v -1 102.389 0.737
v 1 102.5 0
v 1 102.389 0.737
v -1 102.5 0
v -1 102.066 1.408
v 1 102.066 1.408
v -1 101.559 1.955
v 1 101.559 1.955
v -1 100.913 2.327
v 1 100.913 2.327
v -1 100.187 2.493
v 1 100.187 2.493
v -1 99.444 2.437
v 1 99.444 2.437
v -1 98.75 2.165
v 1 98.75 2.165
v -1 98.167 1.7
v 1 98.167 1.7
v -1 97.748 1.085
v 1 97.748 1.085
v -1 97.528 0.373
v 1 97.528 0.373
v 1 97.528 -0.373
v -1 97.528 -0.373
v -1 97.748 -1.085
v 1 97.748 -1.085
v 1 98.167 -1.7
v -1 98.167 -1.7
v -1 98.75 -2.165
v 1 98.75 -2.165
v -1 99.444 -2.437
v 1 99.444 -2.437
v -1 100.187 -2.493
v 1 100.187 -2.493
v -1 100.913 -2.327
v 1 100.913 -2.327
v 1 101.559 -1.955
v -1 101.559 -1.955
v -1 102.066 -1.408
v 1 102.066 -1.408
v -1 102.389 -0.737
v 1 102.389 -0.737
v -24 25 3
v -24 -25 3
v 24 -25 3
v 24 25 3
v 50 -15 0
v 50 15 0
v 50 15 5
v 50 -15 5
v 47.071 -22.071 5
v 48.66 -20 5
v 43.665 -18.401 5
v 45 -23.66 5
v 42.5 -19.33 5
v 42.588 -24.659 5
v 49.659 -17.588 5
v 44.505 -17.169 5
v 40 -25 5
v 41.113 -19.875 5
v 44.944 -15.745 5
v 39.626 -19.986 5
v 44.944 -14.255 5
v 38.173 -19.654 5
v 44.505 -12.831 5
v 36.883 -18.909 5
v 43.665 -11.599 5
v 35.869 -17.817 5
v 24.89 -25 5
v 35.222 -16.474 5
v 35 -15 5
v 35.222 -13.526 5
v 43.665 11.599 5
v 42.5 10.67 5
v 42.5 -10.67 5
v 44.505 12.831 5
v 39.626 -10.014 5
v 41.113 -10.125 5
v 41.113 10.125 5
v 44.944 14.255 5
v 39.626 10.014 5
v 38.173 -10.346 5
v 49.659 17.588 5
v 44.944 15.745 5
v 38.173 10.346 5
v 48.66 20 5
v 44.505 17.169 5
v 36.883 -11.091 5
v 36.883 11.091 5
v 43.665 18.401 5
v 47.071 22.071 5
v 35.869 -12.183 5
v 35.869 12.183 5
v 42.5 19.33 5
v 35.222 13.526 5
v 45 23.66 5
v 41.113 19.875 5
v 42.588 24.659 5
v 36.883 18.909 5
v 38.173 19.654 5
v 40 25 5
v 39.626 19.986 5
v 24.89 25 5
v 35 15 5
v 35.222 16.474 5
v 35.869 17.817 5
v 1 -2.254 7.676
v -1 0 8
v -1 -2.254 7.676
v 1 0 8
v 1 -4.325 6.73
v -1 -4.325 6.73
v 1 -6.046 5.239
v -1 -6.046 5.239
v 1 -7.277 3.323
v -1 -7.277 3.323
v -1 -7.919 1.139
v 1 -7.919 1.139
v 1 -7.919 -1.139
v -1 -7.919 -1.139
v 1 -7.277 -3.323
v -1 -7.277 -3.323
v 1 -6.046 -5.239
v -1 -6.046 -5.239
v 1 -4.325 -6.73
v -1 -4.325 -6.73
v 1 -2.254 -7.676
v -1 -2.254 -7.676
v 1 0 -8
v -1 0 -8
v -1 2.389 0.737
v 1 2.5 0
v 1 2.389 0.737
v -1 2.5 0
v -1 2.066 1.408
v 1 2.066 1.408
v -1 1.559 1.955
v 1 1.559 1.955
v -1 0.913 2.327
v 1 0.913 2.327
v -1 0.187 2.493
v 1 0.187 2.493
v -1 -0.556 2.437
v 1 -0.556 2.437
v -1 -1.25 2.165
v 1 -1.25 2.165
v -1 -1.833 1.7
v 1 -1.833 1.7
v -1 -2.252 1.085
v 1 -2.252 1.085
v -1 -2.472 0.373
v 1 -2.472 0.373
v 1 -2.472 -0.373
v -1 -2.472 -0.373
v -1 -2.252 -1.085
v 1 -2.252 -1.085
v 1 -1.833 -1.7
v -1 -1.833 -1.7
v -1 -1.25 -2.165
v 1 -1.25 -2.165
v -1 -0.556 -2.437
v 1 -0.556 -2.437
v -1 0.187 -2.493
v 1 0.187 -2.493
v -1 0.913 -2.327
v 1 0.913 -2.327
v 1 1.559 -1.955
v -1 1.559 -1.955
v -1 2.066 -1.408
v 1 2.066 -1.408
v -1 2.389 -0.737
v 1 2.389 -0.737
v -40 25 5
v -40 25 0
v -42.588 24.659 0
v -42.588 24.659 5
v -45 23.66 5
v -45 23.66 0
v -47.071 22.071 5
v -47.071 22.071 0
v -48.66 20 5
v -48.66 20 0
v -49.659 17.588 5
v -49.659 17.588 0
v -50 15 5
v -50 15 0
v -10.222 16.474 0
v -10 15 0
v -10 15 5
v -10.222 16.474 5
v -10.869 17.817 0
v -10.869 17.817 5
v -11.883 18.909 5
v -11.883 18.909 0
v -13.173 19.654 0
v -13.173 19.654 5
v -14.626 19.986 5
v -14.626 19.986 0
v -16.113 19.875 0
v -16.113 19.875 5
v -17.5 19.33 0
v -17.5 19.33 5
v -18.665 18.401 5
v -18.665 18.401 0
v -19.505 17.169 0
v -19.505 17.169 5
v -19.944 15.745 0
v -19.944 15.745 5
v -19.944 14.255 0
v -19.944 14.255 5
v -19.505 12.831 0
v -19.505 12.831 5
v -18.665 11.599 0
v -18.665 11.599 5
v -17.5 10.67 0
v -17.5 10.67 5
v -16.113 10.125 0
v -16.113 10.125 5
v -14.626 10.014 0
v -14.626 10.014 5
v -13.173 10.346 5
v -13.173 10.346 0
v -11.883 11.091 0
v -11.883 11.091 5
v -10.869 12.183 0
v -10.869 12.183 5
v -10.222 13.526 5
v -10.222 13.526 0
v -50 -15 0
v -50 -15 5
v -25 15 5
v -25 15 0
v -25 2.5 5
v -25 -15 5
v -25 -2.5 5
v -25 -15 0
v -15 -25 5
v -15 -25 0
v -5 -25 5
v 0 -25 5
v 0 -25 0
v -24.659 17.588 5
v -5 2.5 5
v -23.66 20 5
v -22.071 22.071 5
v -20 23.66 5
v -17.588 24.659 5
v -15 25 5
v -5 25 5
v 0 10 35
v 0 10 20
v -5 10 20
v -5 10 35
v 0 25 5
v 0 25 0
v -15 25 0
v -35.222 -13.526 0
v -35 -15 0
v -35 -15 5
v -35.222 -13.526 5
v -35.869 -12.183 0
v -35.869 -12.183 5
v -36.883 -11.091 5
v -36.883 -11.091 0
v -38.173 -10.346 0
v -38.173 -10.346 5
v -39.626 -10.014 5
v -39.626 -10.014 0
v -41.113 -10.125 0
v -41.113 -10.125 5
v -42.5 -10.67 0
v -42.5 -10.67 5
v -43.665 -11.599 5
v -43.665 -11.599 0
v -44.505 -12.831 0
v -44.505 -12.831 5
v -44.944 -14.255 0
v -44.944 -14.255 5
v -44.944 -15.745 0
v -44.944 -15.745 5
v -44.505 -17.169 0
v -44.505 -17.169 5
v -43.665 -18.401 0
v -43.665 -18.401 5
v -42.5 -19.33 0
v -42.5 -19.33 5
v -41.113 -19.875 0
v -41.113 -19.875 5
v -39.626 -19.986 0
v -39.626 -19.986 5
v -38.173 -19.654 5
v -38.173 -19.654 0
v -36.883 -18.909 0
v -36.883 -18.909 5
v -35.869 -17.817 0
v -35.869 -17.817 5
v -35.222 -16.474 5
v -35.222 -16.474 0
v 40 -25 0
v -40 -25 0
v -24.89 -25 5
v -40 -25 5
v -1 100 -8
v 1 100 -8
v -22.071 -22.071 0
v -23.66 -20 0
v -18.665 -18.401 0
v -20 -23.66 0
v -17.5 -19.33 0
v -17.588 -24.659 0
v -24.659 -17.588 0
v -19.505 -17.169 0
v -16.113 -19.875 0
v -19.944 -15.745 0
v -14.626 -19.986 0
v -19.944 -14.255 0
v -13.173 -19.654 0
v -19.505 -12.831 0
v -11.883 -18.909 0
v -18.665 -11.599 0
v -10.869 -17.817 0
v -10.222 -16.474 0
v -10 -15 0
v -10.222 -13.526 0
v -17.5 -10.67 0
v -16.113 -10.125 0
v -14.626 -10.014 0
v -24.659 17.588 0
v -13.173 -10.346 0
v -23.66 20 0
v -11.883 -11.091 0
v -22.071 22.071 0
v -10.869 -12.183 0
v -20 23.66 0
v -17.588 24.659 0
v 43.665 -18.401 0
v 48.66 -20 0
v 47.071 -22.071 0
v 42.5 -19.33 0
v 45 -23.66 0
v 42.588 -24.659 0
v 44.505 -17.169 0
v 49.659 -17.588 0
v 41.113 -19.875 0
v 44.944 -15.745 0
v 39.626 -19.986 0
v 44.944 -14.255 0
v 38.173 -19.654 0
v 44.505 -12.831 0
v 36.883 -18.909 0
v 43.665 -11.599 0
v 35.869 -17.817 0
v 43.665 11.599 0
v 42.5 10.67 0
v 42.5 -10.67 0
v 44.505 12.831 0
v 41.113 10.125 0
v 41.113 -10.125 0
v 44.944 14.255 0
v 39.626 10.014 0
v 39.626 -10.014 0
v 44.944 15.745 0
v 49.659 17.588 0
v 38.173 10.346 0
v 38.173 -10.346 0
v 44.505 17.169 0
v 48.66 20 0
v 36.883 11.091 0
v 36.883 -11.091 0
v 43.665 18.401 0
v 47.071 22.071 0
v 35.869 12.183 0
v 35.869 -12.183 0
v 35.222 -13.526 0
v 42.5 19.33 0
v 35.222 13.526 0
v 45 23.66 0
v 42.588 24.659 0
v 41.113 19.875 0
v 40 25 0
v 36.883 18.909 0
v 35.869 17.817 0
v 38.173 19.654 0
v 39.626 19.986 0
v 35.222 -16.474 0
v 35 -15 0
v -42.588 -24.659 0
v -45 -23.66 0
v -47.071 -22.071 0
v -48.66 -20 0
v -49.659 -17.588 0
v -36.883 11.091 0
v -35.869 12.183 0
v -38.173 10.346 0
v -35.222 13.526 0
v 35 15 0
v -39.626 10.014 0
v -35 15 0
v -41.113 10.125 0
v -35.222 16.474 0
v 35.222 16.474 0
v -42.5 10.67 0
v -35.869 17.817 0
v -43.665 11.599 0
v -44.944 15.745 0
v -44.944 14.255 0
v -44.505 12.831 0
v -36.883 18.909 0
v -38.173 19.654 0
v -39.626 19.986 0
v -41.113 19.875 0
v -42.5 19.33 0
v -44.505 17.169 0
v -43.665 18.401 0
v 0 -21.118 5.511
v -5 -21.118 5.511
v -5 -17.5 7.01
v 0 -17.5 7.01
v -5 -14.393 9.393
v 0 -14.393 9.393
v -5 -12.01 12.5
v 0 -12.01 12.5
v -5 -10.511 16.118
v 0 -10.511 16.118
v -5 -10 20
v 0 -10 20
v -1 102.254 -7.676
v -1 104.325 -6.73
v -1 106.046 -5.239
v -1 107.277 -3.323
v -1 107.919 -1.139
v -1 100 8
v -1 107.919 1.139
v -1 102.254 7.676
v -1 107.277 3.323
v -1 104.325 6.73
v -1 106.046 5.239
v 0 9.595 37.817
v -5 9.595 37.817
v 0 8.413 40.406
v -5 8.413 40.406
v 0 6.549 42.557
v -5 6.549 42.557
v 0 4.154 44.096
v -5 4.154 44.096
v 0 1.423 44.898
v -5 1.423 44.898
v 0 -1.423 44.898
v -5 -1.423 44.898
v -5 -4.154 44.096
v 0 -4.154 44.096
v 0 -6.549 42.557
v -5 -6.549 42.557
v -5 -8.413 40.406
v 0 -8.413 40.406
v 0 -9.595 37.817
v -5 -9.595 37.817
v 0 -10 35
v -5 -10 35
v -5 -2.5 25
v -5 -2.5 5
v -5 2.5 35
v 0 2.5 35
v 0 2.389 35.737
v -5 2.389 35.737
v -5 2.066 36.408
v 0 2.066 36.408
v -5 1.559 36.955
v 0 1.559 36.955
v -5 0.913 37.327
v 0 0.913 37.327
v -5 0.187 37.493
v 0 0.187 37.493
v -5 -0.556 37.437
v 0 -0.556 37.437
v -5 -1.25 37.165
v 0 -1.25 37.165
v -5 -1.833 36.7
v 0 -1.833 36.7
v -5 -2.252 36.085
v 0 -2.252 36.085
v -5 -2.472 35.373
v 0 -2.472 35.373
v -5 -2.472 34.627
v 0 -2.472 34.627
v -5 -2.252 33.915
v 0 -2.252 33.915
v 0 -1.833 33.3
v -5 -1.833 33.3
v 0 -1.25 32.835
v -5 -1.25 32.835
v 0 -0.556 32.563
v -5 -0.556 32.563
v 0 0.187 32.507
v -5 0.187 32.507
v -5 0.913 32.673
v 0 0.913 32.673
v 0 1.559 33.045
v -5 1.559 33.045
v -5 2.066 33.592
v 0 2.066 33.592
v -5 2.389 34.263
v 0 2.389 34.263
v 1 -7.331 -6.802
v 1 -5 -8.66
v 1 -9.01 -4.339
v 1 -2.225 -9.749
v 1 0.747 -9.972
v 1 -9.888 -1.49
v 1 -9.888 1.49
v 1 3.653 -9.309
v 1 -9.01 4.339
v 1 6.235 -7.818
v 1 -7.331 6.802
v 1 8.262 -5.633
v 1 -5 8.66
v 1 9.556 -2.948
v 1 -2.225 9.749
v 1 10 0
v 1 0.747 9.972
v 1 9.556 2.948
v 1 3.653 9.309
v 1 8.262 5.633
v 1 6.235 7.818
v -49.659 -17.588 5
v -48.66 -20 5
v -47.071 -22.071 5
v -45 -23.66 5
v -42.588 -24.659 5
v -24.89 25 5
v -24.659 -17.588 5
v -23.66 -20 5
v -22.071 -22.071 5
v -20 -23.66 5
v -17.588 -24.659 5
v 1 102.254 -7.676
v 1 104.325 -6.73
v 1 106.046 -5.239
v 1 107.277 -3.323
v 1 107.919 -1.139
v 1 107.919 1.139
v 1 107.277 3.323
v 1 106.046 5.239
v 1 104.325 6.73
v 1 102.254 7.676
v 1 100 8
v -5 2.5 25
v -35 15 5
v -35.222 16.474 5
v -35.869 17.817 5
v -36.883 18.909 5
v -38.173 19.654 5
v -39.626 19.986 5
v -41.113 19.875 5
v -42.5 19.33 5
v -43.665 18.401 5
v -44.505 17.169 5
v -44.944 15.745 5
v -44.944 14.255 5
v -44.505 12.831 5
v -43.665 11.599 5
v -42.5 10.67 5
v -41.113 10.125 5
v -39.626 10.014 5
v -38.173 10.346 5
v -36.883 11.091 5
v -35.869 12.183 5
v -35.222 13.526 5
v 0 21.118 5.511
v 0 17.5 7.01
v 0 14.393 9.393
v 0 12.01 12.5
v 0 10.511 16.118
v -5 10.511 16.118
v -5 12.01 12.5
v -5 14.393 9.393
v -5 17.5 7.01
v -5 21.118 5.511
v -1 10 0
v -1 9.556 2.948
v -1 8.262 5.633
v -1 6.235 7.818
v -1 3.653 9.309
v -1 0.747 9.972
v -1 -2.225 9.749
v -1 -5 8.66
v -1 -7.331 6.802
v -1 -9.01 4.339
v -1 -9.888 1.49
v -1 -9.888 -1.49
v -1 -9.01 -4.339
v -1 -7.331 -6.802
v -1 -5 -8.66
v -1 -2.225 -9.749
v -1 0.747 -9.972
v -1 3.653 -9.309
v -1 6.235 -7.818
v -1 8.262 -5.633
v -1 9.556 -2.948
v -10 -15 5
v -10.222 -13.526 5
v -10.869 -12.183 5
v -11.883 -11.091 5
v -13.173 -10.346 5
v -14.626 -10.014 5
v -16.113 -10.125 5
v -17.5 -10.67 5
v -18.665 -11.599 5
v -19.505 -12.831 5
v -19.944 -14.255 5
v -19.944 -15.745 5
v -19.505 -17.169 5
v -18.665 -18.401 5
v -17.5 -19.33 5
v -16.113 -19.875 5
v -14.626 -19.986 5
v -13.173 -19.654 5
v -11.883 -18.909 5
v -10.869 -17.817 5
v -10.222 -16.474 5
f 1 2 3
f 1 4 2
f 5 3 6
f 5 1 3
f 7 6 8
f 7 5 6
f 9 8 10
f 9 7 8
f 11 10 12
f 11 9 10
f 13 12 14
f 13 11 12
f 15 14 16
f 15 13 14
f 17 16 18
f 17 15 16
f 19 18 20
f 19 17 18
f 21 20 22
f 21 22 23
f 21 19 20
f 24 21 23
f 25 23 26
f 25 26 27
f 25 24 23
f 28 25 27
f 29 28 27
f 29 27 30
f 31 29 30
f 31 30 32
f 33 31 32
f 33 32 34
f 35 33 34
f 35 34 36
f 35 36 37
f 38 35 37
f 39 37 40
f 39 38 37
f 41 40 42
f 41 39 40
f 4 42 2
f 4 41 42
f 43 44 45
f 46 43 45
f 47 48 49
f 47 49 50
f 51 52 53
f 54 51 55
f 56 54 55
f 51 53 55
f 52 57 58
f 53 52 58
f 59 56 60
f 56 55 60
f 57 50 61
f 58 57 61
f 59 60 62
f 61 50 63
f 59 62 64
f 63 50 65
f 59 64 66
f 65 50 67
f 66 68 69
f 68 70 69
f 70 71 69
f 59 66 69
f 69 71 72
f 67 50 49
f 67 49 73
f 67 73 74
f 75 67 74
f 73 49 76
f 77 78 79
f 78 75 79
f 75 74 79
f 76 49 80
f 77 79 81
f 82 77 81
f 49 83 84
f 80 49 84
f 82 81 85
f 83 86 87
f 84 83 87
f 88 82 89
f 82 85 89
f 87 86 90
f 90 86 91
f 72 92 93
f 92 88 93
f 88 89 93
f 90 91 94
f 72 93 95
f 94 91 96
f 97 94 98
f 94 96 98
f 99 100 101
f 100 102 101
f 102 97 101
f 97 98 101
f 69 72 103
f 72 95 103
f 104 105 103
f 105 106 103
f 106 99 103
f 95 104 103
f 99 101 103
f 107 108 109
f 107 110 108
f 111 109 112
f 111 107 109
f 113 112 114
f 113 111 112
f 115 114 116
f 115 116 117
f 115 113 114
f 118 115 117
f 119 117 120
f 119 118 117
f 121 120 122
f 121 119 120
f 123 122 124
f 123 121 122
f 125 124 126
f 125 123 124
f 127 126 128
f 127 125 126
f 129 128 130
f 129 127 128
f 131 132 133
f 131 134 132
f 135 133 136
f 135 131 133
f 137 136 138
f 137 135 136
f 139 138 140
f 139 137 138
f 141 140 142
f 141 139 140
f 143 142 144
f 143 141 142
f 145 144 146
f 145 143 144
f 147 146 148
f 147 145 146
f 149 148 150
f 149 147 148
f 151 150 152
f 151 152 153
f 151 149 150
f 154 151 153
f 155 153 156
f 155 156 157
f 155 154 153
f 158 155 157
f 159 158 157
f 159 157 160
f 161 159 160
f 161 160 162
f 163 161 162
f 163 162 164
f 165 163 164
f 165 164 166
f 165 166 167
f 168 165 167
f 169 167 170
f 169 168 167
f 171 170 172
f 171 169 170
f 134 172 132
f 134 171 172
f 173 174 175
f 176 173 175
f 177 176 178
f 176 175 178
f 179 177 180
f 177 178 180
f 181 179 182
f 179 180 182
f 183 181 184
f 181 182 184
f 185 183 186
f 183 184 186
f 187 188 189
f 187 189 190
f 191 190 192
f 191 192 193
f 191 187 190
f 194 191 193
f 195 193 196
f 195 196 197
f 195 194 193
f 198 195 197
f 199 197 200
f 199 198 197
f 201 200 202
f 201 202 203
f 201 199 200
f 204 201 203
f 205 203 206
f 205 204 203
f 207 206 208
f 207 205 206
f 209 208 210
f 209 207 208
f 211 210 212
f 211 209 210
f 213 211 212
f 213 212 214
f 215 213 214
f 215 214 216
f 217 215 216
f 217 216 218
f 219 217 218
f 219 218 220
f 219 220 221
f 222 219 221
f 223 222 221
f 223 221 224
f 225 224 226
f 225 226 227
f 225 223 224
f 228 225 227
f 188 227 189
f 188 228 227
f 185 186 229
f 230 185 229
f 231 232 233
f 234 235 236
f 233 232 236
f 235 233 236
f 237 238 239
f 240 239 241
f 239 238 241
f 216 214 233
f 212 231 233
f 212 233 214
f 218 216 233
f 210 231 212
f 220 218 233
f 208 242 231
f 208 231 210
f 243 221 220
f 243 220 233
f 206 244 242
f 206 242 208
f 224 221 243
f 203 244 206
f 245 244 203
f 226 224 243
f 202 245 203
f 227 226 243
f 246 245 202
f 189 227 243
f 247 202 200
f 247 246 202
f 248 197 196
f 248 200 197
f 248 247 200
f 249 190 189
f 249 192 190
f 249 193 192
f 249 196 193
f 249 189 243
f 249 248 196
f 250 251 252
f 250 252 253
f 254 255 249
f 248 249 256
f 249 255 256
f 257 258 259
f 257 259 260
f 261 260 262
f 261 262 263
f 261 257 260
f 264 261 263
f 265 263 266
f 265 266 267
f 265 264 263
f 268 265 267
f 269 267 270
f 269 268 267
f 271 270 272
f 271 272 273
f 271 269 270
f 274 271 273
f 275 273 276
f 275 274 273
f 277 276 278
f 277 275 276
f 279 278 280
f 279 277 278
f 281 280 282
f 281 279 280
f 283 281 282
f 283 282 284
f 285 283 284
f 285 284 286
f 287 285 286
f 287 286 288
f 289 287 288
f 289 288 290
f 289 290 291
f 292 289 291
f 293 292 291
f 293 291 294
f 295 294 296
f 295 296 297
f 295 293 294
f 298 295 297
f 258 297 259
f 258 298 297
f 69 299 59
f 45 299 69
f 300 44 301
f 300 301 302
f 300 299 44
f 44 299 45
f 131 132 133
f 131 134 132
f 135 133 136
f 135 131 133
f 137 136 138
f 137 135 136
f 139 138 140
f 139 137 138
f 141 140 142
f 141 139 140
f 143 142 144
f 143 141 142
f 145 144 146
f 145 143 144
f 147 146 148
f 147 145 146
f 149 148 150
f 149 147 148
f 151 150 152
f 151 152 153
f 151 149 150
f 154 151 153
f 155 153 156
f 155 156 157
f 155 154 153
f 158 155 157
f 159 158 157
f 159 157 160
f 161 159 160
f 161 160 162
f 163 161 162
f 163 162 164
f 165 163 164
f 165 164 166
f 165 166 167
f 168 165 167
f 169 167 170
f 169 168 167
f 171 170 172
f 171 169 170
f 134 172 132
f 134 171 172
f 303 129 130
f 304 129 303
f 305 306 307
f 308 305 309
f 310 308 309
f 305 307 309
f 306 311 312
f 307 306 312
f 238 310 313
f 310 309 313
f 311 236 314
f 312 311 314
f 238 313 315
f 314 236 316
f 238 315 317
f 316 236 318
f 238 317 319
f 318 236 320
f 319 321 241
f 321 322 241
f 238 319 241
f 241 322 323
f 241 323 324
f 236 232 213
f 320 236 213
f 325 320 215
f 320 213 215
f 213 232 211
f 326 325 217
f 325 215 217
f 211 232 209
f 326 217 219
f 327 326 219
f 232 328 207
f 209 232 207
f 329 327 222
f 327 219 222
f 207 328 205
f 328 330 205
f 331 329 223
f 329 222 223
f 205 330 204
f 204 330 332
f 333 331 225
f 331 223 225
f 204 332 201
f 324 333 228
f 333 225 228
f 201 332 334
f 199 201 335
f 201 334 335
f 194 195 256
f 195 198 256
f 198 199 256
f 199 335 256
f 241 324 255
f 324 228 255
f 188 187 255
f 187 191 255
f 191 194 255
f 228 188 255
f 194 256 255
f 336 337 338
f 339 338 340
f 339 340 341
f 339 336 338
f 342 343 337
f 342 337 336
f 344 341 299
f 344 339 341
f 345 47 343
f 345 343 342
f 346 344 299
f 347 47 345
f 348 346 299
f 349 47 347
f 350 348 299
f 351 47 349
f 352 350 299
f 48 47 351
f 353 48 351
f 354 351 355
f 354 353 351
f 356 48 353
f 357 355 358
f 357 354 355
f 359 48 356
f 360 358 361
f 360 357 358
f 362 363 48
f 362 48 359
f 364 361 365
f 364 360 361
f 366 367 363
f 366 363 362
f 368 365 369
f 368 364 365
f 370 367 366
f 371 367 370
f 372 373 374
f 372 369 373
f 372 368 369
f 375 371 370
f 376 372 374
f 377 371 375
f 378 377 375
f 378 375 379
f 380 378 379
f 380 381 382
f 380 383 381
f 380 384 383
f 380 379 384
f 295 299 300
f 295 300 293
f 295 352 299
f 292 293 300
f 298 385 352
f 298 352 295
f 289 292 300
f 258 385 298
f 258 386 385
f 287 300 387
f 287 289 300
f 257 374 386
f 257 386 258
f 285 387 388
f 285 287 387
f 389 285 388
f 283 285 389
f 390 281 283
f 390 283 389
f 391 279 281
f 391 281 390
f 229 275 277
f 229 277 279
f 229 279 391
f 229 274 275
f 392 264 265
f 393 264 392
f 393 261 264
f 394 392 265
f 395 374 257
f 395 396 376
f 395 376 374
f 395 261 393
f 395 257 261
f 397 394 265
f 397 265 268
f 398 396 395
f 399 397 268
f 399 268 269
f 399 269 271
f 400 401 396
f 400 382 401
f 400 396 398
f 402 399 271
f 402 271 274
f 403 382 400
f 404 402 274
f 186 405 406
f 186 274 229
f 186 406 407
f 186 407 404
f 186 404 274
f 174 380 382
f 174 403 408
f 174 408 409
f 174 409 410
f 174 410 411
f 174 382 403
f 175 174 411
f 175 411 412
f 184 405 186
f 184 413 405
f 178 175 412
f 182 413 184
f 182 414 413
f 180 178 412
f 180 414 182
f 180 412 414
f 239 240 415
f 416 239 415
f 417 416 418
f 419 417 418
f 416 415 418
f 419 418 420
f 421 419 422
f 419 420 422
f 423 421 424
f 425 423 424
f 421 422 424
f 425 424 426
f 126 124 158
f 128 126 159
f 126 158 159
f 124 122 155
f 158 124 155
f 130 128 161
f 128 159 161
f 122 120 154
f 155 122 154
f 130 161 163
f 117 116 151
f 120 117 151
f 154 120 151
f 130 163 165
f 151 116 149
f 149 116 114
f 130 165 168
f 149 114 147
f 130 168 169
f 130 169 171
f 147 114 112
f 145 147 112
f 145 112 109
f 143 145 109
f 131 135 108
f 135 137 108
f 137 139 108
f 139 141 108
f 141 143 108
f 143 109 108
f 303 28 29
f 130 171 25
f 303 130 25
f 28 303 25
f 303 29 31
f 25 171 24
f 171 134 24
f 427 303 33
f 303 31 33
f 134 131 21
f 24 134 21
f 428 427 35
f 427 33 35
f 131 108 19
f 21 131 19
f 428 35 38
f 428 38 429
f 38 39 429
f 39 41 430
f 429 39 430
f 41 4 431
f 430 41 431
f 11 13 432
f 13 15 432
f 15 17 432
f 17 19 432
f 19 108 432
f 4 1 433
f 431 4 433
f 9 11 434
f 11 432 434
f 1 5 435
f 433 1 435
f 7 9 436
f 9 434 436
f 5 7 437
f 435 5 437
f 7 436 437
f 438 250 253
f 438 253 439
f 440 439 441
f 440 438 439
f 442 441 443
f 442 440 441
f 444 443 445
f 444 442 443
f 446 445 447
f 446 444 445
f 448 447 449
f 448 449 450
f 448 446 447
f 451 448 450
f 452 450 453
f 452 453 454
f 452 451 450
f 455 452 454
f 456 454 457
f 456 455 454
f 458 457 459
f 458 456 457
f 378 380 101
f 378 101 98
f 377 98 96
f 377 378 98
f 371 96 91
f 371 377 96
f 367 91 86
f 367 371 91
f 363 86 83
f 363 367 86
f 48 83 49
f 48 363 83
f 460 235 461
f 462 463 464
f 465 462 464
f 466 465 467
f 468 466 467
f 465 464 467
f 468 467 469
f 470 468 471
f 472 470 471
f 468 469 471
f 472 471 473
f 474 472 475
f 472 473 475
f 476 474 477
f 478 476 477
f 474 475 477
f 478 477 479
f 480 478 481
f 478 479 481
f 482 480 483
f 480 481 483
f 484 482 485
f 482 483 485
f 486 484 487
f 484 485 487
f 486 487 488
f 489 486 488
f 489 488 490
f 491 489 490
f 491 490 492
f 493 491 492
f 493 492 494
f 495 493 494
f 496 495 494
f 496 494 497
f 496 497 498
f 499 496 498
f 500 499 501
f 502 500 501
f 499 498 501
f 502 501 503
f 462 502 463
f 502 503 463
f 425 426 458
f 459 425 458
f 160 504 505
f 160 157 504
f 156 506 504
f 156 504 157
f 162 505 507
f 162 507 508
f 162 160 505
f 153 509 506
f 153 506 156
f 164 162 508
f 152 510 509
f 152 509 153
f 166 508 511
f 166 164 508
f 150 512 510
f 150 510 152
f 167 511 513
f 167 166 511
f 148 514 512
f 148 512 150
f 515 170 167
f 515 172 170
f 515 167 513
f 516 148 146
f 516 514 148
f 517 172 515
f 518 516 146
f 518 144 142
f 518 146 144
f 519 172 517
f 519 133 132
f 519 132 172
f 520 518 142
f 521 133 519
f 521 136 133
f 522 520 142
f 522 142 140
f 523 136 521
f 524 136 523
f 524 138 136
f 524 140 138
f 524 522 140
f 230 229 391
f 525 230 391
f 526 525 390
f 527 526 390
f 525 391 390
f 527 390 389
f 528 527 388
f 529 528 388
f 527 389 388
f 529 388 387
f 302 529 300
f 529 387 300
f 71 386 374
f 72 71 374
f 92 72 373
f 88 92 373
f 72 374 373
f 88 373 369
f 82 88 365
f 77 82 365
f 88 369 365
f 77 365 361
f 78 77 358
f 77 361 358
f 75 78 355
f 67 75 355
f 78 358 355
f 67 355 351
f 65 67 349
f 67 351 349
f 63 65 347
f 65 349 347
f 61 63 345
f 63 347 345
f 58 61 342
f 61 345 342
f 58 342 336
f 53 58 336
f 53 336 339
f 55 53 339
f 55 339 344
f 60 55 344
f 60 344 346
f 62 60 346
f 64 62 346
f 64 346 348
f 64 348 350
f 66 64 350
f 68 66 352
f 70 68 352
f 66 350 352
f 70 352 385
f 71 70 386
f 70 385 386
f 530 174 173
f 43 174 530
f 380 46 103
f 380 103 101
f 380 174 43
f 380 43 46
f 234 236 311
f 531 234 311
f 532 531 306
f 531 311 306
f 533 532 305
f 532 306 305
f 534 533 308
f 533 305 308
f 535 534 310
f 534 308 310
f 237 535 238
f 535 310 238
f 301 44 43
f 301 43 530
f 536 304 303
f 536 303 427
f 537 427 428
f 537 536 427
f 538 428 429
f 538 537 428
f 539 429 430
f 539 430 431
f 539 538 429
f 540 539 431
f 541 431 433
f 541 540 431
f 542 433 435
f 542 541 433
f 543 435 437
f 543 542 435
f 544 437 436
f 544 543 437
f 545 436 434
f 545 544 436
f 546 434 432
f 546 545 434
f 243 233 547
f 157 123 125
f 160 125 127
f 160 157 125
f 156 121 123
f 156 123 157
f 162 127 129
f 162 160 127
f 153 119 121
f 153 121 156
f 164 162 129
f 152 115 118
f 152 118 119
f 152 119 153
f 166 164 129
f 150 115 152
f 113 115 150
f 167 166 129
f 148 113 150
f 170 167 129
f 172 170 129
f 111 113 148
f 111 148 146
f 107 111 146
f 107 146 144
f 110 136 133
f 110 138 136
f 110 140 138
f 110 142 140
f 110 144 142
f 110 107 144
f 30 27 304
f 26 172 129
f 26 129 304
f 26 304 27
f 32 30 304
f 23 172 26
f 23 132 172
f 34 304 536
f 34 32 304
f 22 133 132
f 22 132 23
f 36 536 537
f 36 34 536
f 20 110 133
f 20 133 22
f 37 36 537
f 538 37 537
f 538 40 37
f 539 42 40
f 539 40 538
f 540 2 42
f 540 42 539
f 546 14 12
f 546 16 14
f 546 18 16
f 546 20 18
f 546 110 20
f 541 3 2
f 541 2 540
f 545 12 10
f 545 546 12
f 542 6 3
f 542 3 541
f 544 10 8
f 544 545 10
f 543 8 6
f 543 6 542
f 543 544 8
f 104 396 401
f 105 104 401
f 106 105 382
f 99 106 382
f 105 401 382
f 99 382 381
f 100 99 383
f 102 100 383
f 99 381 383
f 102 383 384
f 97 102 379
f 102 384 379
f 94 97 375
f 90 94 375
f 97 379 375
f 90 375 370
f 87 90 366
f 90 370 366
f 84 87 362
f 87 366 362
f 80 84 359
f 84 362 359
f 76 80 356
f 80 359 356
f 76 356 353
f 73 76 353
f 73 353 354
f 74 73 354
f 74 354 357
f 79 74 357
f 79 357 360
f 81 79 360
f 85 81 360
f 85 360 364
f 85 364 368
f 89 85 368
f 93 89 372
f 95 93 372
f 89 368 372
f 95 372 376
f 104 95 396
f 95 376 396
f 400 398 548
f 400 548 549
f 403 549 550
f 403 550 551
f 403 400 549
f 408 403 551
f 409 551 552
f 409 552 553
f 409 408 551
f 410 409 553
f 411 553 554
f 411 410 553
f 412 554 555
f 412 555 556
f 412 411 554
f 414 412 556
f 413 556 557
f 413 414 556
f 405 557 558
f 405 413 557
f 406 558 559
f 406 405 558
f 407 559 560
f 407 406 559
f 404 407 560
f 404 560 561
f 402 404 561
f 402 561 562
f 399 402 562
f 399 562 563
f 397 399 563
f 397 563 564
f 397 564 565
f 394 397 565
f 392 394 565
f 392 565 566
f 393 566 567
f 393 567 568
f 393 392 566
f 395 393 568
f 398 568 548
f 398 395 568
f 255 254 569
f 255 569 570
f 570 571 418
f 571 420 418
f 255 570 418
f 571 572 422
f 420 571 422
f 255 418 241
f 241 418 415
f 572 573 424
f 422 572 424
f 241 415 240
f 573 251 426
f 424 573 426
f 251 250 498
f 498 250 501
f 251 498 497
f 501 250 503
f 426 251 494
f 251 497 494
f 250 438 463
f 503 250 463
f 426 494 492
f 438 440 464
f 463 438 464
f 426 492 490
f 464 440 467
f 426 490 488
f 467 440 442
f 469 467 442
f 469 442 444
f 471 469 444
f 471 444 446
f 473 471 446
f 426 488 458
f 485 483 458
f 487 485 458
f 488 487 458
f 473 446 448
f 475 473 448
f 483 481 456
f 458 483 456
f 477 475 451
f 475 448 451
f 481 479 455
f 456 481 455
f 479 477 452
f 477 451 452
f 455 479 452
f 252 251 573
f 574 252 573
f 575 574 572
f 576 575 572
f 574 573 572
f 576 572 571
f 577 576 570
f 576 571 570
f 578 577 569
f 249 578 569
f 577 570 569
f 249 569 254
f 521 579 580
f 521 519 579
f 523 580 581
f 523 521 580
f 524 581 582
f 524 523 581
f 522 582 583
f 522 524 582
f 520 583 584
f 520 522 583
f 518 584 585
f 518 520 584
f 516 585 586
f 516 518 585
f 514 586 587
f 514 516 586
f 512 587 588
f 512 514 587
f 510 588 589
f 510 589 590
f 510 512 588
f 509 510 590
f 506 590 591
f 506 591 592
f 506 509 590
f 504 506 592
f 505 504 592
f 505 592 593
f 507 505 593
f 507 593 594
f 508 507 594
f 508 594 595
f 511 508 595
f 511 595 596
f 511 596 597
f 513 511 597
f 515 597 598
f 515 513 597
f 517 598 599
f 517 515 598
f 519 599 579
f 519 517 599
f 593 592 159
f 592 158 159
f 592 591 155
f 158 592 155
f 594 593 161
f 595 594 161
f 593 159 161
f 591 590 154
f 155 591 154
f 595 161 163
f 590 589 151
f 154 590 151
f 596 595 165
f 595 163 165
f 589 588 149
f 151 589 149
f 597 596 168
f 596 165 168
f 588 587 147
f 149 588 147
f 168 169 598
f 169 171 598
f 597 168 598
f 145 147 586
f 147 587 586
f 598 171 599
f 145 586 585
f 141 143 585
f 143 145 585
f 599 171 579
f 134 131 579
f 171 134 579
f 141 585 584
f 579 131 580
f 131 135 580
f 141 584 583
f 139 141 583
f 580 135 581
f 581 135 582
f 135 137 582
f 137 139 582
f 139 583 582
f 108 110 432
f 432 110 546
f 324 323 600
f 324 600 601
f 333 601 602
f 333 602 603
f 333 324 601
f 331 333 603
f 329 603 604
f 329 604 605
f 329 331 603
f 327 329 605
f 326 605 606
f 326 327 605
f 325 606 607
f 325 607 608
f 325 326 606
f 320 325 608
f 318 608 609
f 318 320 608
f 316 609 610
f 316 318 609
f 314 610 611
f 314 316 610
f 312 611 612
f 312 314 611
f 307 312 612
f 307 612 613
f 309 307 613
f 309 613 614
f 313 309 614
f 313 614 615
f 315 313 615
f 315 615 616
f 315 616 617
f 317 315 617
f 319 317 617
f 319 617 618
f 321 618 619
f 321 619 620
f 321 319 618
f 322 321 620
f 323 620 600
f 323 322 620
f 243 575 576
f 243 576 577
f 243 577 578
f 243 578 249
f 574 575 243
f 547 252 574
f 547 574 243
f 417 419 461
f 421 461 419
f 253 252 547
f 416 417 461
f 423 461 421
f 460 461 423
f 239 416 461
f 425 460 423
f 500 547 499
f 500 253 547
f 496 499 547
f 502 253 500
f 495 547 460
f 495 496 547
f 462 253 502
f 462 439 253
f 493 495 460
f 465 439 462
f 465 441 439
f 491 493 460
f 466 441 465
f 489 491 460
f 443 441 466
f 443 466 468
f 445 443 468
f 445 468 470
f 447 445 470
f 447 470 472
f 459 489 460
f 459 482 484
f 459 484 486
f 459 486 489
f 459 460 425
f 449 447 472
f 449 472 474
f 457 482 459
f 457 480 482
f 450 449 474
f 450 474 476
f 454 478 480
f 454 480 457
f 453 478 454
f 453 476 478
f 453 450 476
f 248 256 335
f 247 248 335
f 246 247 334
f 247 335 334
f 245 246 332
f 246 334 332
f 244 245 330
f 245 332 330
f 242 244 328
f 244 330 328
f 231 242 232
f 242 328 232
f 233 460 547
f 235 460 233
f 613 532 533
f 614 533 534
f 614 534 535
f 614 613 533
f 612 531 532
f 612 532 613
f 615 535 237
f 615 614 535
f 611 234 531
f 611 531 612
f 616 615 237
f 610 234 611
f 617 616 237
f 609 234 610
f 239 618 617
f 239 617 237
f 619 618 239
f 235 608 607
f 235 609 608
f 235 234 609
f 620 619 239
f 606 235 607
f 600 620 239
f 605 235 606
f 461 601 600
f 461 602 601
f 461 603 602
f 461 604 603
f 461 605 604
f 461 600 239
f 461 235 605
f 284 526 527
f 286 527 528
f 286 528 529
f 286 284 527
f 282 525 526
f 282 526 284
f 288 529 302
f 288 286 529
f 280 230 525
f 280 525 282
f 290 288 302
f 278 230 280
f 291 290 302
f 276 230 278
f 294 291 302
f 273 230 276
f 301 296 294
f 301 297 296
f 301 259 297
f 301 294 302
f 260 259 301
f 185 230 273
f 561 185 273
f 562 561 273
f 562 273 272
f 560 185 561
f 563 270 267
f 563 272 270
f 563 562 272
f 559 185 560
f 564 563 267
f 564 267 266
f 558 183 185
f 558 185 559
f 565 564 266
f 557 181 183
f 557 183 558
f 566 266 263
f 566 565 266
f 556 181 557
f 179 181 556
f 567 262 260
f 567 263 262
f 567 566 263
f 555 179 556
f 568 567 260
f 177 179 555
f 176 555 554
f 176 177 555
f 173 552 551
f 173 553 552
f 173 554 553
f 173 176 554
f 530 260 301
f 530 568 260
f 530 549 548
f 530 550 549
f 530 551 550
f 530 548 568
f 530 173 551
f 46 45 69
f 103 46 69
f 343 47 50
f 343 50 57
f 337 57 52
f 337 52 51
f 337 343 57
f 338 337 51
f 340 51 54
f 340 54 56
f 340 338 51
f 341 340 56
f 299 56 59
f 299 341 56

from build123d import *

# Parameters (mm, degrees)
SKETCH_R          = 5
PAD_DEPTH         = 5
POCKET_DEPTH      = 25.001
POCKET_DEPTH_BACK = 25.001
SKETCH002_R       = 5
PAD001_DEPTH      = 5
SKETCH003_R       = 2.5
PAD002_DEPTH      = 5
PAD003_DEPTH      = 2.5
SKETCH005_R       = 10
SKETCH005_R_2     = 2.5
PAD004_DEPTH      = 1
SKETCH006_R       = 2.5
PAD005_DEPTH      = 1


with BuildPart() as base:
    # Sketch → Pad (new body)
    with BuildSketch(Plane.XY):
        with BuildLine():
            Line((-50, 15), (-50, -15))
            ThreePointArc((-50, -15), (-47.071068, -22.071068), (-40, -25))
            Line((-40, -25), (0, -25))
            Line((0, -25), (0, 25))
            Line((0, 25), (-40, 25))
            ThreePointArc((-40, 25), (-47.071068, 22.071068), (-50, 15))
        make_face()
        with Locations((-40, 15)):
            Circle(SKETCH_R, mode=Mode.SUBTRACT)
        with Locations((-40, -15)):
            Circle(SKETCH_R, mode=Mode.SUBTRACT)
    extrude(amount=PAD_DEPTH)

    # Sketch001 → Pocket (cut, two sides)
    with BuildSketch(Plane.XZ) as pocket_sk:
        Polygon((0, 3), (-24, 3), (-24.890457, 5), (0, 5), align=None)
    extrude(amount=-POCKET_DEPTH, mode=Mode.SUBTRACT)
    extrude(pocket_sk.sketch, amount=POCKET_DEPTH_BACK, mode=Mode.SUBTRACT)

    # Mirrored: Base across YZ


with BuildPart() as base_1:
    add(base.part)
    add(base.part.mirror(Plane.YZ))


with BuildPart() as bracket:
    # Sketch002 → Pad001 (new body)
    with BuildSketch(Plane.XY):
        with BuildLine():
            Line((0, 25), (-15, 25))
            ThreePointArc((-15, 25), (-22.071068, 22.071068), (-25, 15))
            Line((-25, 15), (-25, -15))
            ThreePointArc((-25, -15), (-22.071068, -22.071068), (-15, -25))
            Line((-15, -25), (0, -25))
            Line((0, -25), (0, 25))
        make_face()
        with Locations((-15, 15)):
            Circle(SKETCH002_R, mode=Mode.SUBTRACT)
        with Locations((-15, -15)):
            Circle(SKETCH002_R, mode=Mode.SUBTRACT)
    extrude(amount=PAD001_DEPTH)

    # Sketch003 → Pad002 (join)
    with BuildSketch(Plane.YZ):
        with BuildLine():
            ThreePointArc((-25, 5), (-14.393398, 9.393398), (-10, 20))
            Line((-10, 20), (-10, 35))
            ThreePointArc((10, 35), (0, 45), (-10, 35))
            Line((10, 20), (10, 35))
            ThreePointArc((10, 20), (14.393398, 9.393398), (25, 5))
            Line((-25, 5), (25, 5))
        make_face()
        with Locations((0, 35)):
            Circle(SKETCH003_R, mode=Mode.SUBTRACT)
    extrude(amount=-PAD002_DEPTH)

    # Sketch004 → Pad003 (join, symmetric)
    with BuildSketch(Plane.XZ):
        Polygon((-25, 5), (-5, 5), (-5, 25), align=None)
    extrude(amount=PAD003_DEPTH, both=True)


with BuildPart() as oring:
    # Sketch005 → Pad004 (new body, symmetric)
    with BuildSketch(Plane.YZ):
        Circle(SKETCH005_R)
        Circle(SKETCH005_R_2, mode=Mode.SUBTRACT)
    extrude(amount=PAD004_DEPTH, both=True)


with BuildPart() as link:
    # Sketch006 → Pad005 (new body, symmetric)
    with BuildSketch(Plane.YZ):
        with BuildLine():
            ThreePointArc((0, 8), (-8, 0), (0, -8))
            Line((0, -8), (100, -8))
            ThreePointArc((100, -8), (108, 0), (100, 8))
            Line((0, 8), (100, 8))
        make_face()
        Circle(SKETCH006_R, mode=Mode.SUBTRACT)
        with Locations((100, 0)):
            Circle(SKETCH006_R, mode=Mode.SUBTRACT)
    extrude(amount=PAD005_DEPTH, both=True)


solid = Compound([base_1.part, bracket.part, oring.part, link.part])
